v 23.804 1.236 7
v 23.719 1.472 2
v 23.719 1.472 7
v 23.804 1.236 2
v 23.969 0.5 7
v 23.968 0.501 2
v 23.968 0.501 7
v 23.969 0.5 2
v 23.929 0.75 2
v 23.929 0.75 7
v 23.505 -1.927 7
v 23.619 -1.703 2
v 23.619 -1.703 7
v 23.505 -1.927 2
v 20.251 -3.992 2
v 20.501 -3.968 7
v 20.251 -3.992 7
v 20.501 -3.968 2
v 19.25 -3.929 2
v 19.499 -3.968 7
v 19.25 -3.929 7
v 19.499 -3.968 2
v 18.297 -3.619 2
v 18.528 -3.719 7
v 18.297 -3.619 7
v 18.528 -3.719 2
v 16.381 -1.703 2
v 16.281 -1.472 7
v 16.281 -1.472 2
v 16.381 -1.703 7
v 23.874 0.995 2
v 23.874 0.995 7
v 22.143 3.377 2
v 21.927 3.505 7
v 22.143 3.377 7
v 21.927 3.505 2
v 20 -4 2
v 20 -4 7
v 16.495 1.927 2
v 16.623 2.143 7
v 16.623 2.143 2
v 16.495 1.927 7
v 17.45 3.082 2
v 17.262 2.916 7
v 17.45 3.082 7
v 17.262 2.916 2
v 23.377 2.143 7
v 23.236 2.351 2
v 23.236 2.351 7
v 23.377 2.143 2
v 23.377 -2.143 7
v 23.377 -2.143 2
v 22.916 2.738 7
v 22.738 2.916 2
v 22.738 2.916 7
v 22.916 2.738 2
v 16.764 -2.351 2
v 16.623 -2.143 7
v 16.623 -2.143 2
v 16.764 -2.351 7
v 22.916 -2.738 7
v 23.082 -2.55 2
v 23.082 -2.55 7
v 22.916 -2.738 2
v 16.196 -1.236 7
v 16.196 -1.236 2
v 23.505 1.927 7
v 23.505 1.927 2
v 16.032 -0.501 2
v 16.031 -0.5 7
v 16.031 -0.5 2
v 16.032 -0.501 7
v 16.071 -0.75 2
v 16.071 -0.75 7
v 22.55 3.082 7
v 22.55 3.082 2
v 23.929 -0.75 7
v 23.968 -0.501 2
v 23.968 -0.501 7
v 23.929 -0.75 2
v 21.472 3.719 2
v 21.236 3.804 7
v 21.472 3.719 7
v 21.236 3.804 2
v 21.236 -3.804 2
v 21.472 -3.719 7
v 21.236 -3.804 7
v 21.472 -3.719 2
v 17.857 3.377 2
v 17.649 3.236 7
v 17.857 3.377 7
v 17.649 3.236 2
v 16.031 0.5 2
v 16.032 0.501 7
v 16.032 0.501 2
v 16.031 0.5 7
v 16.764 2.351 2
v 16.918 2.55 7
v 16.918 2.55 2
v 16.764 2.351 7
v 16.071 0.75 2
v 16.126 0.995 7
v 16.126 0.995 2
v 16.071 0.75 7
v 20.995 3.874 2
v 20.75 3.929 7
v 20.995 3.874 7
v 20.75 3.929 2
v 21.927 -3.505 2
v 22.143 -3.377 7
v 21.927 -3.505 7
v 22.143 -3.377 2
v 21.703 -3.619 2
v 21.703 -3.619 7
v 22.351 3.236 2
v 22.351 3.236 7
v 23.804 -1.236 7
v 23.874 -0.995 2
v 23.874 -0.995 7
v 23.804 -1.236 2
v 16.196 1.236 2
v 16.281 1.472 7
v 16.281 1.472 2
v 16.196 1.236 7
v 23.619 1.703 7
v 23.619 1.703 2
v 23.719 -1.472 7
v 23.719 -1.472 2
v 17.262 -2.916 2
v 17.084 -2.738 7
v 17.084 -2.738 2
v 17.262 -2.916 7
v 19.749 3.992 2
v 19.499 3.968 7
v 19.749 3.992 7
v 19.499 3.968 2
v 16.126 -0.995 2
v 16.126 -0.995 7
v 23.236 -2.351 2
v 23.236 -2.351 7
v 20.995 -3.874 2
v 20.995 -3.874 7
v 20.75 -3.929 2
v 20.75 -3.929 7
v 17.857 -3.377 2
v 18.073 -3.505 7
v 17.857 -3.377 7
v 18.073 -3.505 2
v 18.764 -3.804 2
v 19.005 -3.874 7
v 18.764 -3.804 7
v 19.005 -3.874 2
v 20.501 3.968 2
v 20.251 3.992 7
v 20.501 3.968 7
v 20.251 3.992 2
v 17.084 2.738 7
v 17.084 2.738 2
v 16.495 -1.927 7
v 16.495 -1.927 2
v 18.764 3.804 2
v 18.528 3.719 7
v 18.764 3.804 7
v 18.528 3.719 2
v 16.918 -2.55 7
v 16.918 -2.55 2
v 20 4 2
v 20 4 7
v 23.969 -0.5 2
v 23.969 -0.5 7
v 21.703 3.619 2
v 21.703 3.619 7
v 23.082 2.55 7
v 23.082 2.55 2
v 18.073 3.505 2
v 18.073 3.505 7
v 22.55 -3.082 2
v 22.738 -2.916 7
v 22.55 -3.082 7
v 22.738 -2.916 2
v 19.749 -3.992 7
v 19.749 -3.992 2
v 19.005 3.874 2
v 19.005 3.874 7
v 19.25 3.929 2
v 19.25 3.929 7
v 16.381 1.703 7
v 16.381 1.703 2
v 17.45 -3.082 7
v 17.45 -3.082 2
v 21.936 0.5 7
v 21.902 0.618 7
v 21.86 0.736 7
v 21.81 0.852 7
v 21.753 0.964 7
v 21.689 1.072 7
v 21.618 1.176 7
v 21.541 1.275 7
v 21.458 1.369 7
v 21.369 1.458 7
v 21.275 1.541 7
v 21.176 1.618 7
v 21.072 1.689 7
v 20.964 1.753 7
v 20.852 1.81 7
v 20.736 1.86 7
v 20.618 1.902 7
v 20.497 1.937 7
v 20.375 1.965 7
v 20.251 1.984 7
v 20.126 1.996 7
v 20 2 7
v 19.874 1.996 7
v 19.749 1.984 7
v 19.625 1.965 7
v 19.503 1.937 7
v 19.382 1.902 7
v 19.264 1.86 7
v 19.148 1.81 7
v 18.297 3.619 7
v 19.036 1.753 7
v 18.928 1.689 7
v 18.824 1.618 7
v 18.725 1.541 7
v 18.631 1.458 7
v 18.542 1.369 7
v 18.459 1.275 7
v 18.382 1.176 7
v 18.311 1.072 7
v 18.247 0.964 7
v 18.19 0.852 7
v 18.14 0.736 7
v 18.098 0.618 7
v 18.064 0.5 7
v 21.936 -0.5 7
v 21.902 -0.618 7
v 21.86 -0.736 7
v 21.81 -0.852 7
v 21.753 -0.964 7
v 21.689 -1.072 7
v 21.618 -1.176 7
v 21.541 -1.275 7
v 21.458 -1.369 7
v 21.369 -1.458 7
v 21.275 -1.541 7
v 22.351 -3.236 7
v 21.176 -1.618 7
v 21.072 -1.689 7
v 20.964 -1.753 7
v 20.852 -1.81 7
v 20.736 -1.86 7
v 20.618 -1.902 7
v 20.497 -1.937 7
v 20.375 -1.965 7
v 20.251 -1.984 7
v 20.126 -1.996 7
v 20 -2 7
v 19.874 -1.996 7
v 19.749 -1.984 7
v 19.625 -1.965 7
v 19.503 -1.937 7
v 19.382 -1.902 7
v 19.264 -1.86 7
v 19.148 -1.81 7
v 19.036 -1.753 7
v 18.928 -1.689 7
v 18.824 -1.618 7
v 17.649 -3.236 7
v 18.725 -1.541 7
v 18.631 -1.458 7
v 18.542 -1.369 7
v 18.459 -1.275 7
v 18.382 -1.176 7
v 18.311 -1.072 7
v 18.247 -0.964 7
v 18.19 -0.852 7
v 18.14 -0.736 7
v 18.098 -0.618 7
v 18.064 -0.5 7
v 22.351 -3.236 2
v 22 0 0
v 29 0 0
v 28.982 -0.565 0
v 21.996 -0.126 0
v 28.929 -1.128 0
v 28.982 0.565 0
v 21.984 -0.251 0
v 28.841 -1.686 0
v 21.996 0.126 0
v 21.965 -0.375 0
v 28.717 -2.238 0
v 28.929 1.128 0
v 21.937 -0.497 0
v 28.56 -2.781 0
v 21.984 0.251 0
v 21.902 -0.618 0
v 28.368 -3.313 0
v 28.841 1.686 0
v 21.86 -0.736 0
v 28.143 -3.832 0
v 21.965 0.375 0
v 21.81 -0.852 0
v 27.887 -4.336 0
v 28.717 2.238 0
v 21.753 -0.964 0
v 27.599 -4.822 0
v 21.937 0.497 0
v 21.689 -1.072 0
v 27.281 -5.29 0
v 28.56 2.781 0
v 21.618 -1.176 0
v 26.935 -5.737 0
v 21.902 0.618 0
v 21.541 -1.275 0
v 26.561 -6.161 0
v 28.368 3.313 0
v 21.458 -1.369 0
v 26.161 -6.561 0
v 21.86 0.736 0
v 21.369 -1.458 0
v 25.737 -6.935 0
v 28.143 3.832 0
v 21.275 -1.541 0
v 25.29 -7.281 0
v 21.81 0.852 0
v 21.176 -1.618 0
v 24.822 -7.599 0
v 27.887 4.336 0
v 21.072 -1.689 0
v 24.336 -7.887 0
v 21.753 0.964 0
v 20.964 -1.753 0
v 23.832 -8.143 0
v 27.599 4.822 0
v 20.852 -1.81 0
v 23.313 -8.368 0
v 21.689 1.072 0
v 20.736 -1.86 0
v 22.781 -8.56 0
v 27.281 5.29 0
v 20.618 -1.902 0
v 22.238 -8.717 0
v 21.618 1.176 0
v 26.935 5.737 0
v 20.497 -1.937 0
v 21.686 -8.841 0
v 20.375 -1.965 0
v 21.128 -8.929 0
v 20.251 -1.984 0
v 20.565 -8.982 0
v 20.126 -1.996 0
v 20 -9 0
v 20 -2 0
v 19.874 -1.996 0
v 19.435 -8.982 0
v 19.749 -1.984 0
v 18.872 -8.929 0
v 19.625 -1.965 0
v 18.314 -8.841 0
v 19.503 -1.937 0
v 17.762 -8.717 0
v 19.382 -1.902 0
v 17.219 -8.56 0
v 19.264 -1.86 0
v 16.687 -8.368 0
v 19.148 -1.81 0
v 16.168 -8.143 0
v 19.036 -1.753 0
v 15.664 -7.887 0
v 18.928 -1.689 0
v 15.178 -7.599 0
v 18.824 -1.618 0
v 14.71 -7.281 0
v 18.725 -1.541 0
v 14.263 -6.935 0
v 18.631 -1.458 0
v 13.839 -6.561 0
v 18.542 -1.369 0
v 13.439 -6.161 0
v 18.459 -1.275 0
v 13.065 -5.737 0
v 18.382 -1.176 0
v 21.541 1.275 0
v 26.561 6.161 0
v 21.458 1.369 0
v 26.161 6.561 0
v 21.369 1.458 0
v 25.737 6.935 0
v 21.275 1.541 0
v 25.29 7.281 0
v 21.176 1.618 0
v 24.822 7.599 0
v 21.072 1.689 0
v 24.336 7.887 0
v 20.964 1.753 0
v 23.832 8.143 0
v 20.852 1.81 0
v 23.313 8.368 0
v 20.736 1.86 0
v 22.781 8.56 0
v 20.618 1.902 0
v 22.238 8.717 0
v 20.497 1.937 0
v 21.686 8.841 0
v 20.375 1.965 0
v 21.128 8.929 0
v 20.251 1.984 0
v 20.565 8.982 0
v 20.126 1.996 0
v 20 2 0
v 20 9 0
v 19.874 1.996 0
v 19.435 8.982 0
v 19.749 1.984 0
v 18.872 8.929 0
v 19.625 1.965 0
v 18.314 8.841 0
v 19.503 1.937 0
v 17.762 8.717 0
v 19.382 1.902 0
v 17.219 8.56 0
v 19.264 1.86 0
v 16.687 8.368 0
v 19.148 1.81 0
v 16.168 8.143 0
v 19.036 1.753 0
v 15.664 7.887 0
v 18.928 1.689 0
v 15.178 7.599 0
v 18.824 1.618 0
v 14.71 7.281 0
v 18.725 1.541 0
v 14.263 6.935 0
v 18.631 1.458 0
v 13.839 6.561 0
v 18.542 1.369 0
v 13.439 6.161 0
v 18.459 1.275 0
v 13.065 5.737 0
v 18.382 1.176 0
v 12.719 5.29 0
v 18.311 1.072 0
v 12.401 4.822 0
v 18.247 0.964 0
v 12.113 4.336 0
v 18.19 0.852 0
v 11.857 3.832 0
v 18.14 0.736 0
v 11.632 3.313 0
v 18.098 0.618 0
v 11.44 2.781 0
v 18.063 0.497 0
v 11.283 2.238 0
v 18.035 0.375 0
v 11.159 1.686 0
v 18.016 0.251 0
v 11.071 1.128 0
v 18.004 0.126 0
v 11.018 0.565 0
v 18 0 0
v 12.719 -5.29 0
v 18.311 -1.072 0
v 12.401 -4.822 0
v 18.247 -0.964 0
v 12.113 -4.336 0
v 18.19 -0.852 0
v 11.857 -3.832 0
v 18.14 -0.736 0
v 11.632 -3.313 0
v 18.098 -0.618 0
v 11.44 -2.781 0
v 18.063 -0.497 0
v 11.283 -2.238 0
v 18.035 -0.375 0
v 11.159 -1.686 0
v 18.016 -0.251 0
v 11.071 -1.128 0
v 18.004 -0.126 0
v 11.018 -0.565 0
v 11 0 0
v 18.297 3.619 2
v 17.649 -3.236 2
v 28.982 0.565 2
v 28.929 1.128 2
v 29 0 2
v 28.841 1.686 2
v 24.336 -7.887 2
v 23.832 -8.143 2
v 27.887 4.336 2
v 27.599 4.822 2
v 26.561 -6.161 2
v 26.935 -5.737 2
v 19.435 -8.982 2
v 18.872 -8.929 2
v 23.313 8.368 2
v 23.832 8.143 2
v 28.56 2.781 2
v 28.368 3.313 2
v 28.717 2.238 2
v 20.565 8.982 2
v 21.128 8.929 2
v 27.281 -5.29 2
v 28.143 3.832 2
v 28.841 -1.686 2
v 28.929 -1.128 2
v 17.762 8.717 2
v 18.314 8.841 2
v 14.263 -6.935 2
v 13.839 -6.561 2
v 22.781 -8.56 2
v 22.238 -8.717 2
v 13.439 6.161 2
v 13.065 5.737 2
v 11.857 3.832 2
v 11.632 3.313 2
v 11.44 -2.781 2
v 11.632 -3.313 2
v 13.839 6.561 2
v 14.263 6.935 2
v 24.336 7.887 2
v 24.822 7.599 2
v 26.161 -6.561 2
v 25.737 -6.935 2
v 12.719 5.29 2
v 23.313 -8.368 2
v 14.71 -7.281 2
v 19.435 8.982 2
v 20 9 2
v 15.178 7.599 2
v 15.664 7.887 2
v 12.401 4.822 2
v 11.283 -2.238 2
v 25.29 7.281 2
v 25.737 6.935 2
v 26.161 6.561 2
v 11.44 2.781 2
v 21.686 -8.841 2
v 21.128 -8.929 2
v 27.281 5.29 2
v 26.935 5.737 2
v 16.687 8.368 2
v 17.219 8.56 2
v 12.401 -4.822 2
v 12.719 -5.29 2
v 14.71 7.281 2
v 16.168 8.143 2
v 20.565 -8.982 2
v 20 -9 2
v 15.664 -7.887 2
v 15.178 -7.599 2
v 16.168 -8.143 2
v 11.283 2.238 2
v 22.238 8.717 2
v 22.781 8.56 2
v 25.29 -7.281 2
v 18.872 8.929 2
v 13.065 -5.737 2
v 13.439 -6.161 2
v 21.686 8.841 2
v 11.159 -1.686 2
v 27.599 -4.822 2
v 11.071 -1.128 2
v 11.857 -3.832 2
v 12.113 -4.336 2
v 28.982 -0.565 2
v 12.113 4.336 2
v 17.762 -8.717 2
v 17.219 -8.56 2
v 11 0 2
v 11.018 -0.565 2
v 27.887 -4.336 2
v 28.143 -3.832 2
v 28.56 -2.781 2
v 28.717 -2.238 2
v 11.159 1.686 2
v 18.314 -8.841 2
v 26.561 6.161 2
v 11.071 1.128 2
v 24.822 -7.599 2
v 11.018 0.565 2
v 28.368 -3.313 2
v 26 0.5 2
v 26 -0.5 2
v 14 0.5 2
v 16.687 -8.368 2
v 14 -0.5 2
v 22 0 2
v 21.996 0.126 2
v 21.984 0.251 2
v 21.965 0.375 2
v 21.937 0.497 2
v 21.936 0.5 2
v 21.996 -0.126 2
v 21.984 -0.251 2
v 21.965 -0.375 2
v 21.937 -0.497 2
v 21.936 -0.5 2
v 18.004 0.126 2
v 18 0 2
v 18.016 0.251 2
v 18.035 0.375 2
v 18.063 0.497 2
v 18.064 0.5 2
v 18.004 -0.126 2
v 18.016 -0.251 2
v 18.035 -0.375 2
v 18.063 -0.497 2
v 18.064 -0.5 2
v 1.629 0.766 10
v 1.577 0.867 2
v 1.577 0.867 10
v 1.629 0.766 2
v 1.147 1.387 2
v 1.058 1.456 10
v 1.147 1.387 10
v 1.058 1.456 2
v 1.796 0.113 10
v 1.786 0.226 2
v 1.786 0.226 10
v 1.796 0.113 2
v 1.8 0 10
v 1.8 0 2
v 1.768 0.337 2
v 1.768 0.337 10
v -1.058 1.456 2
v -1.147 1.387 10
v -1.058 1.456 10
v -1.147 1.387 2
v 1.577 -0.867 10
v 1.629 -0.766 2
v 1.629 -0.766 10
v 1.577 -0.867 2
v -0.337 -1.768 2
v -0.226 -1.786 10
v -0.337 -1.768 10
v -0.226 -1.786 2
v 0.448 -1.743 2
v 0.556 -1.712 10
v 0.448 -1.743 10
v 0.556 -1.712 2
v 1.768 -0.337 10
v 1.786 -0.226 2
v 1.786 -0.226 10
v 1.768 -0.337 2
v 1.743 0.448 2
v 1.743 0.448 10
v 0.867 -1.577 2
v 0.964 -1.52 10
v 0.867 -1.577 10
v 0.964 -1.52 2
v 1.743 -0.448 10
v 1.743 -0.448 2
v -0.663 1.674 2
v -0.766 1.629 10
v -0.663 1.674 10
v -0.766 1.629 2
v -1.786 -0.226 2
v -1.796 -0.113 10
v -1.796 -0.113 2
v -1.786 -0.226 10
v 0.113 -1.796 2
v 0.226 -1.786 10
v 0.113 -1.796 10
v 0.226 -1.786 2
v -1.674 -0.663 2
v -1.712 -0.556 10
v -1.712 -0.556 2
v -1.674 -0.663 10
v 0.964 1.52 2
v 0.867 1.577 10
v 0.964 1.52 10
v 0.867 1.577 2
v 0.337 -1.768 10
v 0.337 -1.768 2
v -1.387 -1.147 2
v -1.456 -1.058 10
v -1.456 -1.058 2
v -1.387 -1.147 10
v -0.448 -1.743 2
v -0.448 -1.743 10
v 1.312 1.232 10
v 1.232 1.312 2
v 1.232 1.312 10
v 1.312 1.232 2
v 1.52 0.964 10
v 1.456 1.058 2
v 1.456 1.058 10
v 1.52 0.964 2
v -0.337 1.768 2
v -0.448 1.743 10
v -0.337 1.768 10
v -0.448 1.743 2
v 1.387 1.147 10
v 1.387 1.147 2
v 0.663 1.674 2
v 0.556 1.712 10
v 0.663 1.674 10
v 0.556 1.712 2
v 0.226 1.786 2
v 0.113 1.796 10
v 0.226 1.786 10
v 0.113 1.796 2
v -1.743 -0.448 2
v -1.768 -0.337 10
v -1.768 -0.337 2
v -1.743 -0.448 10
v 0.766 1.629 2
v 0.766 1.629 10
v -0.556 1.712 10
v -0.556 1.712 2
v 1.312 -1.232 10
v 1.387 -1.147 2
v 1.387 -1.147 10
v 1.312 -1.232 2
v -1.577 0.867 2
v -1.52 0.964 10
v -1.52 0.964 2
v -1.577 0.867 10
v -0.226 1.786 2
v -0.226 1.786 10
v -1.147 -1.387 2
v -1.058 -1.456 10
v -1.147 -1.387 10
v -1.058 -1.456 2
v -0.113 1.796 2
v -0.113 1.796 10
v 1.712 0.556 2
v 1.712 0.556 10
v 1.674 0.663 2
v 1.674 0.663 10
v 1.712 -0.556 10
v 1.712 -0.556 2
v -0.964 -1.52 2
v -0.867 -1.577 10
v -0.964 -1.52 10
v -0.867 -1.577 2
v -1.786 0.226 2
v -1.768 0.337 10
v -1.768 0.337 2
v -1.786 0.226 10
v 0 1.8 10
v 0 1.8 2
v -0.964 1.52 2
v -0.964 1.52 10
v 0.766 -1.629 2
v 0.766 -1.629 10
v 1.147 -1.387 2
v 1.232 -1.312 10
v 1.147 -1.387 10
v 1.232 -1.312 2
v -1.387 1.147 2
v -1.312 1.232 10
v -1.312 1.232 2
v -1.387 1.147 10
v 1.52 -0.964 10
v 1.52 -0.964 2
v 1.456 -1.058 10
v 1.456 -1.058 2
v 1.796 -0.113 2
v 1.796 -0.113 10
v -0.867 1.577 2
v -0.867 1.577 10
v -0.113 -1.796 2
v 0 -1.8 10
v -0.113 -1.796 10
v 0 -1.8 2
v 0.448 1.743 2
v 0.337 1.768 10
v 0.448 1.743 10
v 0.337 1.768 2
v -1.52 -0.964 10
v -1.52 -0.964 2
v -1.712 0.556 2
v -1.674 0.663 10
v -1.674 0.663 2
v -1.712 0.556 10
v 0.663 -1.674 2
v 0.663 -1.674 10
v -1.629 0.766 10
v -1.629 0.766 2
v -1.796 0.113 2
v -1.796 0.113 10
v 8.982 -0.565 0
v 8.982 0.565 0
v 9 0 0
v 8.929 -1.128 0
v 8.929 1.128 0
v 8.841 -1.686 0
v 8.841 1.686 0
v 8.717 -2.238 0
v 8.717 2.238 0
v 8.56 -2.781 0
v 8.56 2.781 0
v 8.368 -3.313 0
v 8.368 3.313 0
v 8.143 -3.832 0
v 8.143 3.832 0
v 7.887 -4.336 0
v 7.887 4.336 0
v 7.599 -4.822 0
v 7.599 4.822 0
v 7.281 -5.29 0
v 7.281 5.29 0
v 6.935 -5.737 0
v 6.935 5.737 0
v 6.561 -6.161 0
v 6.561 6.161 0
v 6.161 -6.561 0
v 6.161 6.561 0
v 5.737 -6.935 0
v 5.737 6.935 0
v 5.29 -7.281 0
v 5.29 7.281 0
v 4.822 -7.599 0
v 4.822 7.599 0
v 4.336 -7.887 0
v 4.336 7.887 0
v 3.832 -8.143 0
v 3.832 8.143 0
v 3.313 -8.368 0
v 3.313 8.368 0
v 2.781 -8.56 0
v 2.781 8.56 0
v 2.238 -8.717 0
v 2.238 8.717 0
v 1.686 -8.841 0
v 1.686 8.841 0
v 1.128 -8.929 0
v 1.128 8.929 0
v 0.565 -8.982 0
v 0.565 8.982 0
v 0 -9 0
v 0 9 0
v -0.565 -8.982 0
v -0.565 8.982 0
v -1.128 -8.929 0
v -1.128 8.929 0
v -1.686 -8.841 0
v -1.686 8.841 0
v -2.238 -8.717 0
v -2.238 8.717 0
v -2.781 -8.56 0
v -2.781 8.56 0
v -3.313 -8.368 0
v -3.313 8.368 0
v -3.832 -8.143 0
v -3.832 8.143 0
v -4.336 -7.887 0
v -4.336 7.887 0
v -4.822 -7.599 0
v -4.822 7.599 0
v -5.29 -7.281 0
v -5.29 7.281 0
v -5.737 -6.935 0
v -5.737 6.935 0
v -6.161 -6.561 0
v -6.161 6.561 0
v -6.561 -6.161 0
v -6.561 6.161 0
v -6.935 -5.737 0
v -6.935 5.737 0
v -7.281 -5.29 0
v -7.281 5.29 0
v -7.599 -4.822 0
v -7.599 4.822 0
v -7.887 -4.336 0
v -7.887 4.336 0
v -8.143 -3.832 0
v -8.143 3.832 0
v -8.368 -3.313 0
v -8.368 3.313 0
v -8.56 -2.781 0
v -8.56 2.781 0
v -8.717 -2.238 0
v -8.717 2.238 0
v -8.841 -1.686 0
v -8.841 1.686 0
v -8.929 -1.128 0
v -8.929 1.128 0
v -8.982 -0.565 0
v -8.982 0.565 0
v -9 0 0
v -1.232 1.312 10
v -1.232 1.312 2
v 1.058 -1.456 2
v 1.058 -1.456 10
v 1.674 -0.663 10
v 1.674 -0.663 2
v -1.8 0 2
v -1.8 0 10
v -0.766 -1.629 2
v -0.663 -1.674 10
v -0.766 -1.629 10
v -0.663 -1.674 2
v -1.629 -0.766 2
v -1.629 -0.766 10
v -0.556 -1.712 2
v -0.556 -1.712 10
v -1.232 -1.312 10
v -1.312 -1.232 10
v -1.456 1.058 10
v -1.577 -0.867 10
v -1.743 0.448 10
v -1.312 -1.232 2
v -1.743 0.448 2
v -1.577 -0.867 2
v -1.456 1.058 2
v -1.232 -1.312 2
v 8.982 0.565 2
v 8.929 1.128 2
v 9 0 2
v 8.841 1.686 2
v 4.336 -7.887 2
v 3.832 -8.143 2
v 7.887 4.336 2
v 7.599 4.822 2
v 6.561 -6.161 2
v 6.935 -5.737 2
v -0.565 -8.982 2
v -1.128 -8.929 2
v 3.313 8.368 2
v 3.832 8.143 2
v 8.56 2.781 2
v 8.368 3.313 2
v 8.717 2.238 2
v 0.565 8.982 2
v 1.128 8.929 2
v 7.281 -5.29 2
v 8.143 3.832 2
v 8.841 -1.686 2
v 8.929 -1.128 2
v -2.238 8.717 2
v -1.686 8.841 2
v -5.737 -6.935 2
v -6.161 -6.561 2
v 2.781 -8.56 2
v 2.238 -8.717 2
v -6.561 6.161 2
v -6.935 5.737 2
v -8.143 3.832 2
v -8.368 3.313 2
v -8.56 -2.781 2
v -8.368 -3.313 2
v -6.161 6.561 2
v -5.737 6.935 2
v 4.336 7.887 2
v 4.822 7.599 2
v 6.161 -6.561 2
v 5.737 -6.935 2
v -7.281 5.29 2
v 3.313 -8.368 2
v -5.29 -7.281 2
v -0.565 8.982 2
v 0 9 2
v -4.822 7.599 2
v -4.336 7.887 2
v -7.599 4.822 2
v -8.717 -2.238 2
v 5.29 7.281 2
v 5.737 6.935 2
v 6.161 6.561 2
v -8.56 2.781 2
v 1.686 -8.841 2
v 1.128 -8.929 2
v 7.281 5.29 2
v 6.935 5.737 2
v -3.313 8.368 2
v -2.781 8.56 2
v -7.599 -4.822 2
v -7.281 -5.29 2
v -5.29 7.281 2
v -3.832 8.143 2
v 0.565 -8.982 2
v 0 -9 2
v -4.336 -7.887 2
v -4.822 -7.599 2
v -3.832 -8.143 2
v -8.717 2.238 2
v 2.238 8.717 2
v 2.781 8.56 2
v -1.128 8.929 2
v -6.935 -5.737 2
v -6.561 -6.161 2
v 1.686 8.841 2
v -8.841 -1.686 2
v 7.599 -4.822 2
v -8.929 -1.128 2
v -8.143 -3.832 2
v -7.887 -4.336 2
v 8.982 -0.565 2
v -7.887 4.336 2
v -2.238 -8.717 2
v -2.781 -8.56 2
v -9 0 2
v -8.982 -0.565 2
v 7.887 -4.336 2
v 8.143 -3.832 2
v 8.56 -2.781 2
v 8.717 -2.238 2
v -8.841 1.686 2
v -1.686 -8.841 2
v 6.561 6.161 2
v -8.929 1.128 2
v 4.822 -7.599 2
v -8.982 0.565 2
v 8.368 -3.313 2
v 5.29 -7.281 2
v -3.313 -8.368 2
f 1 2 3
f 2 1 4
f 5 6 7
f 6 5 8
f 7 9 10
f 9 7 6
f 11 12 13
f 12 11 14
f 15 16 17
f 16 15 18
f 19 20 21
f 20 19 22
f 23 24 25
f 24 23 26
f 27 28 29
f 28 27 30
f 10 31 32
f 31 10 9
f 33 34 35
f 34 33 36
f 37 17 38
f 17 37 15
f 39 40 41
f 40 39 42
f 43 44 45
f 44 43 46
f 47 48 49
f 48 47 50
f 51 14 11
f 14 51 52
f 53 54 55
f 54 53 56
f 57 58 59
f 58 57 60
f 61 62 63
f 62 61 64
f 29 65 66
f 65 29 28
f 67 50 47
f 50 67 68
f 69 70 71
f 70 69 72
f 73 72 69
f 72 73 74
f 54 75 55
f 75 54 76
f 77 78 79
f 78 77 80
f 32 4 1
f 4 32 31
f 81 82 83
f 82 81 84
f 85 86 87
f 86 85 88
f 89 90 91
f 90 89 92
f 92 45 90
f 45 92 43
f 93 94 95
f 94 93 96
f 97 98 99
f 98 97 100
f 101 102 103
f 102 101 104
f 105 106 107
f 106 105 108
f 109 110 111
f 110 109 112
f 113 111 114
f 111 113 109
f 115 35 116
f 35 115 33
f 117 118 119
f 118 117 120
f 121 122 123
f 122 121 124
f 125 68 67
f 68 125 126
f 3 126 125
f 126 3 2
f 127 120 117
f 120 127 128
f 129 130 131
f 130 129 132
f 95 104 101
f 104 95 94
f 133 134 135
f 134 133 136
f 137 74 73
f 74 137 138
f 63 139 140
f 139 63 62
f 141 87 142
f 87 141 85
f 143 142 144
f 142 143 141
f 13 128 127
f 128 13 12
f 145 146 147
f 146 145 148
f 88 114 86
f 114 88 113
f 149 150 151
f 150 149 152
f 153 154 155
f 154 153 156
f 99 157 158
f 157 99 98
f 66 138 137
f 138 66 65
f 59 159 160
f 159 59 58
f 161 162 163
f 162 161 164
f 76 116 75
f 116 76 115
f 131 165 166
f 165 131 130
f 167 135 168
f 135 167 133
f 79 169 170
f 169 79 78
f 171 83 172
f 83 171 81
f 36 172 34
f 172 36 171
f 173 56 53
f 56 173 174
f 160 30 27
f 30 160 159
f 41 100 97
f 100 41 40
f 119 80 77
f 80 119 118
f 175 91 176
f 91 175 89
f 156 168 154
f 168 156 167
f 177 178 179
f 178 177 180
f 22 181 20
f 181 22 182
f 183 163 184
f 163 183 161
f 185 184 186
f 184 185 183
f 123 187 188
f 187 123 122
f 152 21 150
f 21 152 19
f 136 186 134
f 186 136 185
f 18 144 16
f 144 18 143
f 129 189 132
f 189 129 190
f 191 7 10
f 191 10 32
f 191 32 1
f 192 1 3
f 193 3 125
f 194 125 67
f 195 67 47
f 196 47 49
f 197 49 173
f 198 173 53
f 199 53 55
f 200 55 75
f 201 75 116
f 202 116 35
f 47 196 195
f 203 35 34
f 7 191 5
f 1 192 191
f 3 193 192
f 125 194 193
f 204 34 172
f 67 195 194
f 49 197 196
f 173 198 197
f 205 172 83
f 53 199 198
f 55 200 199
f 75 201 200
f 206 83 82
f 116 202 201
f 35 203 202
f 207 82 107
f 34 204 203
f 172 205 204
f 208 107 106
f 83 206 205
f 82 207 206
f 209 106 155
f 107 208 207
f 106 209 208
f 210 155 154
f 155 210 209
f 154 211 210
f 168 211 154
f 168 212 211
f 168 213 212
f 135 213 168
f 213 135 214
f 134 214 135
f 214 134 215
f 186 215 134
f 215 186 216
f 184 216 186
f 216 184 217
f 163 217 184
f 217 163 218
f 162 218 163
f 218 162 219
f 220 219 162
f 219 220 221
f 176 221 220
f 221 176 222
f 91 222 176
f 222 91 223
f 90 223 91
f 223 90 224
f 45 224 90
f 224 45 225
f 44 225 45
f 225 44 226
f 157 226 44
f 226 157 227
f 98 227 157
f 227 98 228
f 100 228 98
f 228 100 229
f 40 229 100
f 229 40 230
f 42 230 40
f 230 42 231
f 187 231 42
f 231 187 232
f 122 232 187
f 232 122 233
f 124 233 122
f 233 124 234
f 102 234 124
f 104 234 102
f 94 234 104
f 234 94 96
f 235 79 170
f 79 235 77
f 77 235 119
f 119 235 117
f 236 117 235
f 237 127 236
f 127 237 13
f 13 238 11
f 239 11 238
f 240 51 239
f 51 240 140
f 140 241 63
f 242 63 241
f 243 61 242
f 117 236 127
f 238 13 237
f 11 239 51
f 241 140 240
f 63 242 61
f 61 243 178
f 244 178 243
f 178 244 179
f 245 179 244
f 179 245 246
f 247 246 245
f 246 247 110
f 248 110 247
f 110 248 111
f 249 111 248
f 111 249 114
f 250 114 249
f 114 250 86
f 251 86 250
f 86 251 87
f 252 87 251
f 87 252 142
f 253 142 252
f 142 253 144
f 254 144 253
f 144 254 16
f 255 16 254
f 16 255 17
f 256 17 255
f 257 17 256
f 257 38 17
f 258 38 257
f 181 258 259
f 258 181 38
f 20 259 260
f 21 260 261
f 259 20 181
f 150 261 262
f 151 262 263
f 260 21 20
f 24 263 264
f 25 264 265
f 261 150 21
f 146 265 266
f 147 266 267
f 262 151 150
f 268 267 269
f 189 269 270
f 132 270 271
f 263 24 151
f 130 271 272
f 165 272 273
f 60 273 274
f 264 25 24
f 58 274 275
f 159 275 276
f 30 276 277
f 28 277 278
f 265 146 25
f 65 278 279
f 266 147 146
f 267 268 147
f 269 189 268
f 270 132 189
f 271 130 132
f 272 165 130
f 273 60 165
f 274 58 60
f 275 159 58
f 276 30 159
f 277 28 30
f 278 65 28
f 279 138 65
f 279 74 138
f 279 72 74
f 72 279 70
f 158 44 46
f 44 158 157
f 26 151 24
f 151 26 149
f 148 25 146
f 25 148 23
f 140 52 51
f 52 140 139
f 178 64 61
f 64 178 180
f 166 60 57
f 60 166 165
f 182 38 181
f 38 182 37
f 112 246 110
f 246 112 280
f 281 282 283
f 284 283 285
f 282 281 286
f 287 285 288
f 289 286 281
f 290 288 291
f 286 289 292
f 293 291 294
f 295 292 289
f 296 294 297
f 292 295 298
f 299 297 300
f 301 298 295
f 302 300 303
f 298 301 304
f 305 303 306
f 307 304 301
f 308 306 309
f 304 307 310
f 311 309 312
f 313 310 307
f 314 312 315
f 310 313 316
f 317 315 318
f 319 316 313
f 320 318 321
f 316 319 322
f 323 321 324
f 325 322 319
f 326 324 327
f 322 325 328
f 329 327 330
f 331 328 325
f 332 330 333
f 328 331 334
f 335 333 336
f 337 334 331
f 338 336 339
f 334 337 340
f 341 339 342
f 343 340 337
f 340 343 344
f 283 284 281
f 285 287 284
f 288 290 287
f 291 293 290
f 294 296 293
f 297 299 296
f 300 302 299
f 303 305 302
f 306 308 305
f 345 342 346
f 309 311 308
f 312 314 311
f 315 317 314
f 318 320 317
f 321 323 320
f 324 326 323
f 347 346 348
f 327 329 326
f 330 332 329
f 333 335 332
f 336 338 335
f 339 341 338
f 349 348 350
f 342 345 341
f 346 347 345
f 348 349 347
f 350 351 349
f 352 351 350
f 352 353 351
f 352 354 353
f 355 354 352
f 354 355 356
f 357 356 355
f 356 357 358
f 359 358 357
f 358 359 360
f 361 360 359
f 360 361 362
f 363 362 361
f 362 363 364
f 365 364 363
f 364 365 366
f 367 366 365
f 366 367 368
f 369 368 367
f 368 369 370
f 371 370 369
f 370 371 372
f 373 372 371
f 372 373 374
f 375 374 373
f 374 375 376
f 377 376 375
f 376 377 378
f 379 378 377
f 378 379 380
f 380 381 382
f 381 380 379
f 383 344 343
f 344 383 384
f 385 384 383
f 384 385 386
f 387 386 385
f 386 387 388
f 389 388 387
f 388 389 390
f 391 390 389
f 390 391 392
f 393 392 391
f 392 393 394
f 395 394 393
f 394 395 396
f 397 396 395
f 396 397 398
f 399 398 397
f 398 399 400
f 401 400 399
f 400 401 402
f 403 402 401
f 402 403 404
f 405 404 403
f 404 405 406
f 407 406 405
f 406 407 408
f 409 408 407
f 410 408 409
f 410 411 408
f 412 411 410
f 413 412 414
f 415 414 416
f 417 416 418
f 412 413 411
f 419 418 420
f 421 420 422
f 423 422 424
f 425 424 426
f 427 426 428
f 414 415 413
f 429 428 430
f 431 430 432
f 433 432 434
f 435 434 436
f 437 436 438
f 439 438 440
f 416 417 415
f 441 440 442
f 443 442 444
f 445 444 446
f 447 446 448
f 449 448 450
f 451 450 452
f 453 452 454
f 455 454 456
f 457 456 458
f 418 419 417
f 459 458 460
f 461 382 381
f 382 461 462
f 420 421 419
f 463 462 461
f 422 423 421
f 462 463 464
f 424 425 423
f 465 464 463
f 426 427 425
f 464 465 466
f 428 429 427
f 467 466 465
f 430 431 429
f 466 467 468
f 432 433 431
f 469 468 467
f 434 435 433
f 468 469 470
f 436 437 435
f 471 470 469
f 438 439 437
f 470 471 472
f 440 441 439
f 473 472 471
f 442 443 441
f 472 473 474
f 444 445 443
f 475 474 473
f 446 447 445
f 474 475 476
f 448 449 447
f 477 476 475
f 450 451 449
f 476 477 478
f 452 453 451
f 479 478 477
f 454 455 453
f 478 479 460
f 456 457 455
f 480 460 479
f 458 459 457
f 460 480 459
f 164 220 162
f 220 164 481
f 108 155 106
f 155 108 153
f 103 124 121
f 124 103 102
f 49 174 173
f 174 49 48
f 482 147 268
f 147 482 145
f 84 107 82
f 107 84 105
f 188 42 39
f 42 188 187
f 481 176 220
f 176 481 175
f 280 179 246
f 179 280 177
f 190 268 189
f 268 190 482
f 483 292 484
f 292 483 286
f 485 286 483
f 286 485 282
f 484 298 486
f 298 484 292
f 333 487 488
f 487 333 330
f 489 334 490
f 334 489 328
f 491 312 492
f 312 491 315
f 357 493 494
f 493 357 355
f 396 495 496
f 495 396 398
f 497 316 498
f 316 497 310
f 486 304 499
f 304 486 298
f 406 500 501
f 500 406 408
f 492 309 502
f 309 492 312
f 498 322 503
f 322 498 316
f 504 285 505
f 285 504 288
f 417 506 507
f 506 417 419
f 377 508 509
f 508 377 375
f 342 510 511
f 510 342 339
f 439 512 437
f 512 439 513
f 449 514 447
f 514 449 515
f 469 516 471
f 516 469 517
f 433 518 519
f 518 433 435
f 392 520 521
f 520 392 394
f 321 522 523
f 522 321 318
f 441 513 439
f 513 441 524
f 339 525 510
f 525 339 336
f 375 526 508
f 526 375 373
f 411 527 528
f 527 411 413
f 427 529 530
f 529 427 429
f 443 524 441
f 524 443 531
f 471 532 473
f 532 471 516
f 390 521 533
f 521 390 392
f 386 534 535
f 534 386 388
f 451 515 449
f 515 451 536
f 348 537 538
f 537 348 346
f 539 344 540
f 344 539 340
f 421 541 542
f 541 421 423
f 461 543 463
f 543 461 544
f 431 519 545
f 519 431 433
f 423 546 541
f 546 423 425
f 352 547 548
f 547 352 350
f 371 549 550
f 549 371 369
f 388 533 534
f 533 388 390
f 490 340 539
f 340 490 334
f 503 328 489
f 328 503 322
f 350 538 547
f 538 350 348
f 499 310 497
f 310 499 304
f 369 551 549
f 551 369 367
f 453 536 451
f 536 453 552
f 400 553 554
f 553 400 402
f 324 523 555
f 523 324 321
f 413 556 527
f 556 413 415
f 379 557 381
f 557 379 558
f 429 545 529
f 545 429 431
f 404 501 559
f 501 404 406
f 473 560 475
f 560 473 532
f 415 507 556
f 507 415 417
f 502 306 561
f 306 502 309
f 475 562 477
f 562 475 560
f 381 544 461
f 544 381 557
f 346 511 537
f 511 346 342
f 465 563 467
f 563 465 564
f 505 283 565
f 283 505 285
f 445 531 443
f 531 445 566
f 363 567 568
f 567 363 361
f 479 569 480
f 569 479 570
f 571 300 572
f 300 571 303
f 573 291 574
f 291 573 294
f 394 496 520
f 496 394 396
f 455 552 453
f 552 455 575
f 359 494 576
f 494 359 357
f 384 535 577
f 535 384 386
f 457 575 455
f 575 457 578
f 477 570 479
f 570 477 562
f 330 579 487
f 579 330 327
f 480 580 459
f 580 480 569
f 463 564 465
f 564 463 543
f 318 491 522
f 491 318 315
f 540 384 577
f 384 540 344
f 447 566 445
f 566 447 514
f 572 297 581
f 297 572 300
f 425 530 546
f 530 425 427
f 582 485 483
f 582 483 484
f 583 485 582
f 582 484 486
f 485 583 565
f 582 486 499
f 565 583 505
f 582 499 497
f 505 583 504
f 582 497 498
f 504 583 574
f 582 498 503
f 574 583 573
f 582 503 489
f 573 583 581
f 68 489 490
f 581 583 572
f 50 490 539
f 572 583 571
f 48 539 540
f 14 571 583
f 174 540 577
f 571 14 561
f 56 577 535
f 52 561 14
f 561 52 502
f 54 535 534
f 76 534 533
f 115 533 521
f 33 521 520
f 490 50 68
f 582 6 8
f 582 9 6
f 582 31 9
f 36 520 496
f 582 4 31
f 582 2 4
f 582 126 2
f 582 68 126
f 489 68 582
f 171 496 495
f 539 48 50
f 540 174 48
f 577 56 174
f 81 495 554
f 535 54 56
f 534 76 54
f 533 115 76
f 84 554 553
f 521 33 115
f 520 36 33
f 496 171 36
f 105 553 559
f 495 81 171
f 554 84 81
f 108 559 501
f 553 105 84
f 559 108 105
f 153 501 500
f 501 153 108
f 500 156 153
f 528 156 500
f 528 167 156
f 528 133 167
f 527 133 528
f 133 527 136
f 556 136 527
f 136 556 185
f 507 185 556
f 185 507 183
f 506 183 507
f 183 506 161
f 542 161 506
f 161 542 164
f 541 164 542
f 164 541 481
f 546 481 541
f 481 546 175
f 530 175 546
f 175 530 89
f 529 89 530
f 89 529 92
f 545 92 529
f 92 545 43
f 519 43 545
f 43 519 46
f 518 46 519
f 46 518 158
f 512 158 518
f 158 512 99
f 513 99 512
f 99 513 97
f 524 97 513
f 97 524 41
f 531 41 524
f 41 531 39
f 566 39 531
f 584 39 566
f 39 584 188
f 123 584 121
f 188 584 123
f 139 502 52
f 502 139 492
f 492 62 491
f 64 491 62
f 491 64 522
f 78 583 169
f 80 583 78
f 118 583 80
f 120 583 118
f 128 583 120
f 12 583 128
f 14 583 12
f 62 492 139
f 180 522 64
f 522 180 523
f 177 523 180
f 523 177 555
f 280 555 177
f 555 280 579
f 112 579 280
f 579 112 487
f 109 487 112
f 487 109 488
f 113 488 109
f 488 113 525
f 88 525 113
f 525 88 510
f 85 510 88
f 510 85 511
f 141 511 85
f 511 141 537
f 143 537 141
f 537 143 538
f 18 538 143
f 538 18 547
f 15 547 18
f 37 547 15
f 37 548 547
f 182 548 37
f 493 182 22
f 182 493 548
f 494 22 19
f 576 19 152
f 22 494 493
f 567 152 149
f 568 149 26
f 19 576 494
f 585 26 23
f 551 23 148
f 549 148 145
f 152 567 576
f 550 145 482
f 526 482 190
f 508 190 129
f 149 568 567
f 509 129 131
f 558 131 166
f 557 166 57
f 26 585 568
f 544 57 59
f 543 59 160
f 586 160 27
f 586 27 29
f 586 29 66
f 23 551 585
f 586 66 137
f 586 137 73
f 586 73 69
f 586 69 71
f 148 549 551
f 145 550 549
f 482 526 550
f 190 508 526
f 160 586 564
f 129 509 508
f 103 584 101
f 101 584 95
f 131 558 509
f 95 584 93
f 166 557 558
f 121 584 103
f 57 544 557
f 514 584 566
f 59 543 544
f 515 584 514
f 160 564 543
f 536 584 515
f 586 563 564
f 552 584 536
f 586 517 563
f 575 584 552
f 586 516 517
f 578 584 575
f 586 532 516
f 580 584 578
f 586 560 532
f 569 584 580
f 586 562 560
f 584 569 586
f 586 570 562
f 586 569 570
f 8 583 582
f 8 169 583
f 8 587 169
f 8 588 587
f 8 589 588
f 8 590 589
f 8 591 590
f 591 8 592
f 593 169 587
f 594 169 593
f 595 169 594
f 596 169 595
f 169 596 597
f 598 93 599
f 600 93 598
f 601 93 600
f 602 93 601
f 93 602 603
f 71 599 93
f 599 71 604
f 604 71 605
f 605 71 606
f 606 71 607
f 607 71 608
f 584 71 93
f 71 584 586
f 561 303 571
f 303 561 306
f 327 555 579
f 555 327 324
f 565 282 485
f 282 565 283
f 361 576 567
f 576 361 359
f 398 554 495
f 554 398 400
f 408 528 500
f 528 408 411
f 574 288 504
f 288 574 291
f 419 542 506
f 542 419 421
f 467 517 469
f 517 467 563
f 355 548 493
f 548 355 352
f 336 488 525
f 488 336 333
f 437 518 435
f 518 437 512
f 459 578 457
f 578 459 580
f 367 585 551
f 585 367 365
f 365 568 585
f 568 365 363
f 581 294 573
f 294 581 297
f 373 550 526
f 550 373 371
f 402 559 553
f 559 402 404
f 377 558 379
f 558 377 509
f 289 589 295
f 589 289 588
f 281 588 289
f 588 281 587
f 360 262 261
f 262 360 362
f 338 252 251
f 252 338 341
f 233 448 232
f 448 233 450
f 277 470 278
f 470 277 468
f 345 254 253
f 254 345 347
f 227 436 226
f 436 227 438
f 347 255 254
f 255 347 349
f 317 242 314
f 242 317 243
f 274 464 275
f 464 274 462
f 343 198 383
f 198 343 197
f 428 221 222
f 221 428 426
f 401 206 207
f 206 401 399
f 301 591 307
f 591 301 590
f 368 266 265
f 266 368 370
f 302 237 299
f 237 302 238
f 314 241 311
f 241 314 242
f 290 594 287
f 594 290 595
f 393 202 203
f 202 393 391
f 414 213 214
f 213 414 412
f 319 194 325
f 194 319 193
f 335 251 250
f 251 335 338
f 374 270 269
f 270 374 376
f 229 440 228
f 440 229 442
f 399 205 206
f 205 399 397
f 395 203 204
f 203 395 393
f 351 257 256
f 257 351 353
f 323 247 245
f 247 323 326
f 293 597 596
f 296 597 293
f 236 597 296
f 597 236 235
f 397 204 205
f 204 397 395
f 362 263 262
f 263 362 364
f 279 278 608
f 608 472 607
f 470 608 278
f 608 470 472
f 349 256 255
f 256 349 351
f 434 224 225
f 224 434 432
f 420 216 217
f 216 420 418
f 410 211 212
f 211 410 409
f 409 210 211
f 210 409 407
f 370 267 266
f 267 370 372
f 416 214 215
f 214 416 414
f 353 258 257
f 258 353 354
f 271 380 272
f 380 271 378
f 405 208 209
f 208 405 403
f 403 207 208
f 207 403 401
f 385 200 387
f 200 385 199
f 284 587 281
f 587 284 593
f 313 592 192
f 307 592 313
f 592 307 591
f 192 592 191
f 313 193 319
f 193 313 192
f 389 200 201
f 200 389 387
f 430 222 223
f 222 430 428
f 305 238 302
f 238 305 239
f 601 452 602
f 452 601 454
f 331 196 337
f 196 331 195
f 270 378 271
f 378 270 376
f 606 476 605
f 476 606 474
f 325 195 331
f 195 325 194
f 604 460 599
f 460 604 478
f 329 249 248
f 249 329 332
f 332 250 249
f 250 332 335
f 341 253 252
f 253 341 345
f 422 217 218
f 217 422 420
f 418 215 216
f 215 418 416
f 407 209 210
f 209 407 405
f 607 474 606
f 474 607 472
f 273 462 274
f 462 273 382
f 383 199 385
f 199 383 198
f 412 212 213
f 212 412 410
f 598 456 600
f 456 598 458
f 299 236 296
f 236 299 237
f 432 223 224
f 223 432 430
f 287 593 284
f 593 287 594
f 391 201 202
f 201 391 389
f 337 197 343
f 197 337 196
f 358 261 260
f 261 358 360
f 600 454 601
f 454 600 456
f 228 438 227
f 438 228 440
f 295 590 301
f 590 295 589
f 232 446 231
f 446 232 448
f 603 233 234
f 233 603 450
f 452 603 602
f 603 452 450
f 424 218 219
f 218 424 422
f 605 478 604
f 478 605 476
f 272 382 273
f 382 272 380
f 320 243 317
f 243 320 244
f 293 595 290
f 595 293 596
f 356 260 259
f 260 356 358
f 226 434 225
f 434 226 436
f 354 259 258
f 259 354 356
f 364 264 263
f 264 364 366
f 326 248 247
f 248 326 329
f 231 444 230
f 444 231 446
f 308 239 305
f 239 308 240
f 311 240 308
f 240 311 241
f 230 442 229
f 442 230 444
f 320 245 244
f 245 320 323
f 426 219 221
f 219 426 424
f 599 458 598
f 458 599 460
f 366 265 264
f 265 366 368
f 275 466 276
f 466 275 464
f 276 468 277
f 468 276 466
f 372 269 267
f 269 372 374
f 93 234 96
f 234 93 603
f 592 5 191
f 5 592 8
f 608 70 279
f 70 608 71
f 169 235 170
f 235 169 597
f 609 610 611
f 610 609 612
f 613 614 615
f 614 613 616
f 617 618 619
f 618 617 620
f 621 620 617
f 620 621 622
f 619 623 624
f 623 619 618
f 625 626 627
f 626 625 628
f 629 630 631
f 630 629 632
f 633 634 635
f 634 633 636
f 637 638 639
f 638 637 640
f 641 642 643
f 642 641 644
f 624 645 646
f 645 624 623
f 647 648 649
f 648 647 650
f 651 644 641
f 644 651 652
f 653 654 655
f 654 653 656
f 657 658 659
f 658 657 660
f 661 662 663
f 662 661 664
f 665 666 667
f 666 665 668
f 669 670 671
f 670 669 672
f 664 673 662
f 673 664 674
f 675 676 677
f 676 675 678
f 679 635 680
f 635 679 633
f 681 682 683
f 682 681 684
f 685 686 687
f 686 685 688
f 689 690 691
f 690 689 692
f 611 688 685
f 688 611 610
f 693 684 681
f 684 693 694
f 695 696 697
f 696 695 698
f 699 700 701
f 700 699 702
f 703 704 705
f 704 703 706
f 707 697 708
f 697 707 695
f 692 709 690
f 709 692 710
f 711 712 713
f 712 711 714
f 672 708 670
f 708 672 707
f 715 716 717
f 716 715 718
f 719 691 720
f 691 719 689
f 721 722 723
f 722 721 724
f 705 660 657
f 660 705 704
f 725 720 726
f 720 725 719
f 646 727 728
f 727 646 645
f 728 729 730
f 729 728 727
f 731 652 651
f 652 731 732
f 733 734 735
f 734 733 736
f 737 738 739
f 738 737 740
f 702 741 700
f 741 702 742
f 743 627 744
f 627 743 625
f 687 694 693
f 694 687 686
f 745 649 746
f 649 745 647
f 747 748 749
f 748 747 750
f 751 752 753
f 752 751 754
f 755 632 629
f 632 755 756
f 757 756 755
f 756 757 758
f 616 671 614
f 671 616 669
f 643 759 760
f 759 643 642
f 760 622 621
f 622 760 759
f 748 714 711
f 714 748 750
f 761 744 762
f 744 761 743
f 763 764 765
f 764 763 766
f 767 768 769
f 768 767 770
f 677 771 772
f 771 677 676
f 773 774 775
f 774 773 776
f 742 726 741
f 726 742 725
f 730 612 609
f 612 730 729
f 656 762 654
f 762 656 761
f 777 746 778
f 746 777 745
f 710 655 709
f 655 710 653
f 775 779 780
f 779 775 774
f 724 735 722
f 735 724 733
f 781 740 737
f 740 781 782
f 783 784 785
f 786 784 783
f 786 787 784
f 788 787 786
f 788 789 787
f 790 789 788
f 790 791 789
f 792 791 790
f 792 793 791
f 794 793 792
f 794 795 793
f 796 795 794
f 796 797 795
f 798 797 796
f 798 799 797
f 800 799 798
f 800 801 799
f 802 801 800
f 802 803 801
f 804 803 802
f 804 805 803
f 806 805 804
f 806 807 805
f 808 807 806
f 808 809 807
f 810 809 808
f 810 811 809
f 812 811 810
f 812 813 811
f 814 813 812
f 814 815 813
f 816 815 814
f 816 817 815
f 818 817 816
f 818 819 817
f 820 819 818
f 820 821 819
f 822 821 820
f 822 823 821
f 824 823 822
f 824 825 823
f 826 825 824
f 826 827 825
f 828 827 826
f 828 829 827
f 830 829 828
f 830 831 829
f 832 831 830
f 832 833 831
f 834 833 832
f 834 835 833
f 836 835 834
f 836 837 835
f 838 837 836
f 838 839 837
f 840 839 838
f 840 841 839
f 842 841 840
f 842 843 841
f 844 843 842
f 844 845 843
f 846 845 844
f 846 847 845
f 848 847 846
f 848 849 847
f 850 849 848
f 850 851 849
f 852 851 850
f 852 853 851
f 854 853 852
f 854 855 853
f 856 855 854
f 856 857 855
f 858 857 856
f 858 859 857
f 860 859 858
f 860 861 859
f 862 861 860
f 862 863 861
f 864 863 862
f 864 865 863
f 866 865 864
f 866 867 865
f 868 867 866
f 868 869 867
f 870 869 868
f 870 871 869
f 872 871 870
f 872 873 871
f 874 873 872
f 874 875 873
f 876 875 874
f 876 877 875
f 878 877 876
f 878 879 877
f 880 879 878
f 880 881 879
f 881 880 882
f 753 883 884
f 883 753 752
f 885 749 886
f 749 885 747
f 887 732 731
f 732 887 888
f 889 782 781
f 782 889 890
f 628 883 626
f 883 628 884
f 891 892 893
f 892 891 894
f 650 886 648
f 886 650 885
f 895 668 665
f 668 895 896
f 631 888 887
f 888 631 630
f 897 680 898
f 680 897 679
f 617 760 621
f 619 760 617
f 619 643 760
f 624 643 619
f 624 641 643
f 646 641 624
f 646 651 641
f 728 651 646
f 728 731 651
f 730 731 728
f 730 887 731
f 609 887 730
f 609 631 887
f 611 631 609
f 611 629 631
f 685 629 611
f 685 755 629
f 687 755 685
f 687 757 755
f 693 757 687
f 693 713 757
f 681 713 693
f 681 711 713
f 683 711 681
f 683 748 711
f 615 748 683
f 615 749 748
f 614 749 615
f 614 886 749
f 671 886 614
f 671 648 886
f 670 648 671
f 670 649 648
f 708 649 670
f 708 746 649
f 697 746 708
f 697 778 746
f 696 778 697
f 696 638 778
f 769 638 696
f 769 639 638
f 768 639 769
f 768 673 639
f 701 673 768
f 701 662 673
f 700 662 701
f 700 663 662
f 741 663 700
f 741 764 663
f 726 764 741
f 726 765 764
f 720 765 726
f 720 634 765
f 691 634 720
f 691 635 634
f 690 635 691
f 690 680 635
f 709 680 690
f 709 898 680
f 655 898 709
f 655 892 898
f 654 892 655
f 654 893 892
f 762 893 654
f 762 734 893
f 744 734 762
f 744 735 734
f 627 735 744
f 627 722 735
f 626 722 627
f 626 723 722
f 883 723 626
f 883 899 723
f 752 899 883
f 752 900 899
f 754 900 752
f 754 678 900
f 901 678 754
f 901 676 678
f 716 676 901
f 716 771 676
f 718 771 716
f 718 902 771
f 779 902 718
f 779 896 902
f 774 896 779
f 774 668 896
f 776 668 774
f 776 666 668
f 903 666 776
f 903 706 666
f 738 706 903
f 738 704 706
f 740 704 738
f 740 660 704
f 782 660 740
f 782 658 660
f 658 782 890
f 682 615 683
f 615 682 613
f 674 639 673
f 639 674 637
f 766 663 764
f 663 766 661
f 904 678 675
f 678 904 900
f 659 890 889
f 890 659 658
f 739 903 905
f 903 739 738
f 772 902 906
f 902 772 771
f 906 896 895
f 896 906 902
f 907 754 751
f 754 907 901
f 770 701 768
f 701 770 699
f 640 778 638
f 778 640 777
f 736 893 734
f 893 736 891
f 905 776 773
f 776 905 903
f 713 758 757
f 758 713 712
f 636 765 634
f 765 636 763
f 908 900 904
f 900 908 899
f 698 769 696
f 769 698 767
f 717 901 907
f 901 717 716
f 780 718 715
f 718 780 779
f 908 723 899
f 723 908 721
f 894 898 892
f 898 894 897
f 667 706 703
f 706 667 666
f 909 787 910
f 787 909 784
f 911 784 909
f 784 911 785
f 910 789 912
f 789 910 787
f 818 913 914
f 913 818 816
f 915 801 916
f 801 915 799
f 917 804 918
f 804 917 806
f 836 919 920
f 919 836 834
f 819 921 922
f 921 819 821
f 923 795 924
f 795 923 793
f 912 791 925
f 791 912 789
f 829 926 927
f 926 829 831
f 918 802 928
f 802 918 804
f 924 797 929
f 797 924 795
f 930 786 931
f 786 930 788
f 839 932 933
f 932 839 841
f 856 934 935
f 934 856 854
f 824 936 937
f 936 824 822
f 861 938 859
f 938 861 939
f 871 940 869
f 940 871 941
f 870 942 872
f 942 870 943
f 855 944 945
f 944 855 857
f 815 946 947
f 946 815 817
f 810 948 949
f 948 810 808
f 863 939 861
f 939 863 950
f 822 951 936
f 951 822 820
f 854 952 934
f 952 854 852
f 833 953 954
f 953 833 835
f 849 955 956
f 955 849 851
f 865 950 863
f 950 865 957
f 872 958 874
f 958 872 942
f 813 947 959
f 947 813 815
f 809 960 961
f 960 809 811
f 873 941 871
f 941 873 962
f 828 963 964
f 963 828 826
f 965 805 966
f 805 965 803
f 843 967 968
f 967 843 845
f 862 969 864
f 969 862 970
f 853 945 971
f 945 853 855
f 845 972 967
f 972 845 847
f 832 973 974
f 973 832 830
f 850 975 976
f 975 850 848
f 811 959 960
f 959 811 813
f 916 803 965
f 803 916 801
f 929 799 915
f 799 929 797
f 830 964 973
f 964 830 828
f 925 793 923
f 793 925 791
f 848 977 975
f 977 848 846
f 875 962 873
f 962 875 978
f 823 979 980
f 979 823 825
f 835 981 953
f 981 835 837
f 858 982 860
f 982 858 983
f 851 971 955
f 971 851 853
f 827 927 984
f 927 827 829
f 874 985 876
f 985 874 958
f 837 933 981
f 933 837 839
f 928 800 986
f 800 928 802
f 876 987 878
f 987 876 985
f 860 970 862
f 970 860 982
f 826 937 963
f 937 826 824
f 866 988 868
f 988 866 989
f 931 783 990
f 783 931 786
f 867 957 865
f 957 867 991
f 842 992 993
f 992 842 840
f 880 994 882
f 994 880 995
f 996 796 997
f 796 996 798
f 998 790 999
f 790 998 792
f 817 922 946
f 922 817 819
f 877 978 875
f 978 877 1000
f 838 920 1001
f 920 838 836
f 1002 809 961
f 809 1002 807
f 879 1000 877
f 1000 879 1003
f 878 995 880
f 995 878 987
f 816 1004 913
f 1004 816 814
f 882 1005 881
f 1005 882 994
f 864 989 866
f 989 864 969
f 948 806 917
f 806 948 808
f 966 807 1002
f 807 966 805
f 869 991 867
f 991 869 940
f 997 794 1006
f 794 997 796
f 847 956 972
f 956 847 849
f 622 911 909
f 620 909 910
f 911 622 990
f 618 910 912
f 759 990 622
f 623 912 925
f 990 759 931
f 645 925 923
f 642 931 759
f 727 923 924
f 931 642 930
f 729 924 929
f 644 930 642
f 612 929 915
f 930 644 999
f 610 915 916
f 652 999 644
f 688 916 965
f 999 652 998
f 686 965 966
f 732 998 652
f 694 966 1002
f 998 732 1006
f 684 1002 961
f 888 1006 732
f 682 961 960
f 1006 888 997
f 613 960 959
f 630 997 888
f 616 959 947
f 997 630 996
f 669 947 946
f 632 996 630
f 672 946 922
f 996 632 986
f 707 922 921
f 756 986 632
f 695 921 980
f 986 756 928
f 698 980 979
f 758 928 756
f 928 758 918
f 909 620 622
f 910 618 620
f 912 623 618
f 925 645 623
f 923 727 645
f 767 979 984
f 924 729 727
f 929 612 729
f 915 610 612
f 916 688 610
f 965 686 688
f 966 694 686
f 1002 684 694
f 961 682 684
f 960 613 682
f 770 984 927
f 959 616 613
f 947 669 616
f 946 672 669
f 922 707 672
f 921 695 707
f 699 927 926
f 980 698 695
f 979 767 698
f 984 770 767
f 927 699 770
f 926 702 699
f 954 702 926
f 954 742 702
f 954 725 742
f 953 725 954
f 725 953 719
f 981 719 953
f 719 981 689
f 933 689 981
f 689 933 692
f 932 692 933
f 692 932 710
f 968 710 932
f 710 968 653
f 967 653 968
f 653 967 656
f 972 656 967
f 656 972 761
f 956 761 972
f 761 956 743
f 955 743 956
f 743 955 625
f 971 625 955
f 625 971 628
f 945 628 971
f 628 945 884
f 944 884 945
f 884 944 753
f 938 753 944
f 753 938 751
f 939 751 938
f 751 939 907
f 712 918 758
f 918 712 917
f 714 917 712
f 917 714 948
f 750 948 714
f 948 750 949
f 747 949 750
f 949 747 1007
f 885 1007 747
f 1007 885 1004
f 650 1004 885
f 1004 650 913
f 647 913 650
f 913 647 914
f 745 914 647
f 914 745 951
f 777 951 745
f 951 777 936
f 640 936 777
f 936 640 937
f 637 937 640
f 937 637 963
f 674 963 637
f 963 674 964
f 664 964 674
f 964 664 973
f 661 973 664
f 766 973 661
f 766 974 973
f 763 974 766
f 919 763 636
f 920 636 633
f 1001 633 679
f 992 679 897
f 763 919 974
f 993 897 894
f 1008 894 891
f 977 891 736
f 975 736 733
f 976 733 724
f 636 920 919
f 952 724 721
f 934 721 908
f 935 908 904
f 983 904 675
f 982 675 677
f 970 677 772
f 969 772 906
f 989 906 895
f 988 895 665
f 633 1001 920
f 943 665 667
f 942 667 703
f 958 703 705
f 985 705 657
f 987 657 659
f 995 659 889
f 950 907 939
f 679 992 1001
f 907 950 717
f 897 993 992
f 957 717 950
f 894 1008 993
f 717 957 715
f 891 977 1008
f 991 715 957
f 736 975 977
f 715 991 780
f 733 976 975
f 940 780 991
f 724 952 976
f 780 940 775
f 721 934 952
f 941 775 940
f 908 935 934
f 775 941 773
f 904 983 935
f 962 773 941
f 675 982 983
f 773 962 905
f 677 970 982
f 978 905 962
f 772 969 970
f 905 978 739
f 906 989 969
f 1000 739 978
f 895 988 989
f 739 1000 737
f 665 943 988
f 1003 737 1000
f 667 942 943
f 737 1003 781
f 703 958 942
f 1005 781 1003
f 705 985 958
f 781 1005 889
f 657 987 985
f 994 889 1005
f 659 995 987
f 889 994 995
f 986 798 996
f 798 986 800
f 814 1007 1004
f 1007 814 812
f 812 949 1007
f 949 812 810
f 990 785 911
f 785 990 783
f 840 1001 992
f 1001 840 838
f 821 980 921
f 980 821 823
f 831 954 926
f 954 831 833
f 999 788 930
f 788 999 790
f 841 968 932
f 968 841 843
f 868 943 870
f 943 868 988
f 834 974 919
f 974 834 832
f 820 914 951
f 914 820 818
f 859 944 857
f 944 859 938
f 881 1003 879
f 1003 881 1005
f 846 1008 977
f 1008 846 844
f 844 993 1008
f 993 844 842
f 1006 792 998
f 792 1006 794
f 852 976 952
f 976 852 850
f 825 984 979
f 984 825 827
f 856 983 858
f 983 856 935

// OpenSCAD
$fn = 100;

module bottom(){
difference(){
    union(){
        cylinder(7,4,4);
        cylinder(2,9,9);
    }
    translate([0,0,-1]) cylinder(12,2,2);
    translate([-6,-0.5,2]) cube([12,1,5]);
}
}

module topo(){
    union(){
        cylinder(10,1.8,1.8);
        cylinder(2,9,9);
    }
}

    translate([20,0,0]) bottom();
topo();
